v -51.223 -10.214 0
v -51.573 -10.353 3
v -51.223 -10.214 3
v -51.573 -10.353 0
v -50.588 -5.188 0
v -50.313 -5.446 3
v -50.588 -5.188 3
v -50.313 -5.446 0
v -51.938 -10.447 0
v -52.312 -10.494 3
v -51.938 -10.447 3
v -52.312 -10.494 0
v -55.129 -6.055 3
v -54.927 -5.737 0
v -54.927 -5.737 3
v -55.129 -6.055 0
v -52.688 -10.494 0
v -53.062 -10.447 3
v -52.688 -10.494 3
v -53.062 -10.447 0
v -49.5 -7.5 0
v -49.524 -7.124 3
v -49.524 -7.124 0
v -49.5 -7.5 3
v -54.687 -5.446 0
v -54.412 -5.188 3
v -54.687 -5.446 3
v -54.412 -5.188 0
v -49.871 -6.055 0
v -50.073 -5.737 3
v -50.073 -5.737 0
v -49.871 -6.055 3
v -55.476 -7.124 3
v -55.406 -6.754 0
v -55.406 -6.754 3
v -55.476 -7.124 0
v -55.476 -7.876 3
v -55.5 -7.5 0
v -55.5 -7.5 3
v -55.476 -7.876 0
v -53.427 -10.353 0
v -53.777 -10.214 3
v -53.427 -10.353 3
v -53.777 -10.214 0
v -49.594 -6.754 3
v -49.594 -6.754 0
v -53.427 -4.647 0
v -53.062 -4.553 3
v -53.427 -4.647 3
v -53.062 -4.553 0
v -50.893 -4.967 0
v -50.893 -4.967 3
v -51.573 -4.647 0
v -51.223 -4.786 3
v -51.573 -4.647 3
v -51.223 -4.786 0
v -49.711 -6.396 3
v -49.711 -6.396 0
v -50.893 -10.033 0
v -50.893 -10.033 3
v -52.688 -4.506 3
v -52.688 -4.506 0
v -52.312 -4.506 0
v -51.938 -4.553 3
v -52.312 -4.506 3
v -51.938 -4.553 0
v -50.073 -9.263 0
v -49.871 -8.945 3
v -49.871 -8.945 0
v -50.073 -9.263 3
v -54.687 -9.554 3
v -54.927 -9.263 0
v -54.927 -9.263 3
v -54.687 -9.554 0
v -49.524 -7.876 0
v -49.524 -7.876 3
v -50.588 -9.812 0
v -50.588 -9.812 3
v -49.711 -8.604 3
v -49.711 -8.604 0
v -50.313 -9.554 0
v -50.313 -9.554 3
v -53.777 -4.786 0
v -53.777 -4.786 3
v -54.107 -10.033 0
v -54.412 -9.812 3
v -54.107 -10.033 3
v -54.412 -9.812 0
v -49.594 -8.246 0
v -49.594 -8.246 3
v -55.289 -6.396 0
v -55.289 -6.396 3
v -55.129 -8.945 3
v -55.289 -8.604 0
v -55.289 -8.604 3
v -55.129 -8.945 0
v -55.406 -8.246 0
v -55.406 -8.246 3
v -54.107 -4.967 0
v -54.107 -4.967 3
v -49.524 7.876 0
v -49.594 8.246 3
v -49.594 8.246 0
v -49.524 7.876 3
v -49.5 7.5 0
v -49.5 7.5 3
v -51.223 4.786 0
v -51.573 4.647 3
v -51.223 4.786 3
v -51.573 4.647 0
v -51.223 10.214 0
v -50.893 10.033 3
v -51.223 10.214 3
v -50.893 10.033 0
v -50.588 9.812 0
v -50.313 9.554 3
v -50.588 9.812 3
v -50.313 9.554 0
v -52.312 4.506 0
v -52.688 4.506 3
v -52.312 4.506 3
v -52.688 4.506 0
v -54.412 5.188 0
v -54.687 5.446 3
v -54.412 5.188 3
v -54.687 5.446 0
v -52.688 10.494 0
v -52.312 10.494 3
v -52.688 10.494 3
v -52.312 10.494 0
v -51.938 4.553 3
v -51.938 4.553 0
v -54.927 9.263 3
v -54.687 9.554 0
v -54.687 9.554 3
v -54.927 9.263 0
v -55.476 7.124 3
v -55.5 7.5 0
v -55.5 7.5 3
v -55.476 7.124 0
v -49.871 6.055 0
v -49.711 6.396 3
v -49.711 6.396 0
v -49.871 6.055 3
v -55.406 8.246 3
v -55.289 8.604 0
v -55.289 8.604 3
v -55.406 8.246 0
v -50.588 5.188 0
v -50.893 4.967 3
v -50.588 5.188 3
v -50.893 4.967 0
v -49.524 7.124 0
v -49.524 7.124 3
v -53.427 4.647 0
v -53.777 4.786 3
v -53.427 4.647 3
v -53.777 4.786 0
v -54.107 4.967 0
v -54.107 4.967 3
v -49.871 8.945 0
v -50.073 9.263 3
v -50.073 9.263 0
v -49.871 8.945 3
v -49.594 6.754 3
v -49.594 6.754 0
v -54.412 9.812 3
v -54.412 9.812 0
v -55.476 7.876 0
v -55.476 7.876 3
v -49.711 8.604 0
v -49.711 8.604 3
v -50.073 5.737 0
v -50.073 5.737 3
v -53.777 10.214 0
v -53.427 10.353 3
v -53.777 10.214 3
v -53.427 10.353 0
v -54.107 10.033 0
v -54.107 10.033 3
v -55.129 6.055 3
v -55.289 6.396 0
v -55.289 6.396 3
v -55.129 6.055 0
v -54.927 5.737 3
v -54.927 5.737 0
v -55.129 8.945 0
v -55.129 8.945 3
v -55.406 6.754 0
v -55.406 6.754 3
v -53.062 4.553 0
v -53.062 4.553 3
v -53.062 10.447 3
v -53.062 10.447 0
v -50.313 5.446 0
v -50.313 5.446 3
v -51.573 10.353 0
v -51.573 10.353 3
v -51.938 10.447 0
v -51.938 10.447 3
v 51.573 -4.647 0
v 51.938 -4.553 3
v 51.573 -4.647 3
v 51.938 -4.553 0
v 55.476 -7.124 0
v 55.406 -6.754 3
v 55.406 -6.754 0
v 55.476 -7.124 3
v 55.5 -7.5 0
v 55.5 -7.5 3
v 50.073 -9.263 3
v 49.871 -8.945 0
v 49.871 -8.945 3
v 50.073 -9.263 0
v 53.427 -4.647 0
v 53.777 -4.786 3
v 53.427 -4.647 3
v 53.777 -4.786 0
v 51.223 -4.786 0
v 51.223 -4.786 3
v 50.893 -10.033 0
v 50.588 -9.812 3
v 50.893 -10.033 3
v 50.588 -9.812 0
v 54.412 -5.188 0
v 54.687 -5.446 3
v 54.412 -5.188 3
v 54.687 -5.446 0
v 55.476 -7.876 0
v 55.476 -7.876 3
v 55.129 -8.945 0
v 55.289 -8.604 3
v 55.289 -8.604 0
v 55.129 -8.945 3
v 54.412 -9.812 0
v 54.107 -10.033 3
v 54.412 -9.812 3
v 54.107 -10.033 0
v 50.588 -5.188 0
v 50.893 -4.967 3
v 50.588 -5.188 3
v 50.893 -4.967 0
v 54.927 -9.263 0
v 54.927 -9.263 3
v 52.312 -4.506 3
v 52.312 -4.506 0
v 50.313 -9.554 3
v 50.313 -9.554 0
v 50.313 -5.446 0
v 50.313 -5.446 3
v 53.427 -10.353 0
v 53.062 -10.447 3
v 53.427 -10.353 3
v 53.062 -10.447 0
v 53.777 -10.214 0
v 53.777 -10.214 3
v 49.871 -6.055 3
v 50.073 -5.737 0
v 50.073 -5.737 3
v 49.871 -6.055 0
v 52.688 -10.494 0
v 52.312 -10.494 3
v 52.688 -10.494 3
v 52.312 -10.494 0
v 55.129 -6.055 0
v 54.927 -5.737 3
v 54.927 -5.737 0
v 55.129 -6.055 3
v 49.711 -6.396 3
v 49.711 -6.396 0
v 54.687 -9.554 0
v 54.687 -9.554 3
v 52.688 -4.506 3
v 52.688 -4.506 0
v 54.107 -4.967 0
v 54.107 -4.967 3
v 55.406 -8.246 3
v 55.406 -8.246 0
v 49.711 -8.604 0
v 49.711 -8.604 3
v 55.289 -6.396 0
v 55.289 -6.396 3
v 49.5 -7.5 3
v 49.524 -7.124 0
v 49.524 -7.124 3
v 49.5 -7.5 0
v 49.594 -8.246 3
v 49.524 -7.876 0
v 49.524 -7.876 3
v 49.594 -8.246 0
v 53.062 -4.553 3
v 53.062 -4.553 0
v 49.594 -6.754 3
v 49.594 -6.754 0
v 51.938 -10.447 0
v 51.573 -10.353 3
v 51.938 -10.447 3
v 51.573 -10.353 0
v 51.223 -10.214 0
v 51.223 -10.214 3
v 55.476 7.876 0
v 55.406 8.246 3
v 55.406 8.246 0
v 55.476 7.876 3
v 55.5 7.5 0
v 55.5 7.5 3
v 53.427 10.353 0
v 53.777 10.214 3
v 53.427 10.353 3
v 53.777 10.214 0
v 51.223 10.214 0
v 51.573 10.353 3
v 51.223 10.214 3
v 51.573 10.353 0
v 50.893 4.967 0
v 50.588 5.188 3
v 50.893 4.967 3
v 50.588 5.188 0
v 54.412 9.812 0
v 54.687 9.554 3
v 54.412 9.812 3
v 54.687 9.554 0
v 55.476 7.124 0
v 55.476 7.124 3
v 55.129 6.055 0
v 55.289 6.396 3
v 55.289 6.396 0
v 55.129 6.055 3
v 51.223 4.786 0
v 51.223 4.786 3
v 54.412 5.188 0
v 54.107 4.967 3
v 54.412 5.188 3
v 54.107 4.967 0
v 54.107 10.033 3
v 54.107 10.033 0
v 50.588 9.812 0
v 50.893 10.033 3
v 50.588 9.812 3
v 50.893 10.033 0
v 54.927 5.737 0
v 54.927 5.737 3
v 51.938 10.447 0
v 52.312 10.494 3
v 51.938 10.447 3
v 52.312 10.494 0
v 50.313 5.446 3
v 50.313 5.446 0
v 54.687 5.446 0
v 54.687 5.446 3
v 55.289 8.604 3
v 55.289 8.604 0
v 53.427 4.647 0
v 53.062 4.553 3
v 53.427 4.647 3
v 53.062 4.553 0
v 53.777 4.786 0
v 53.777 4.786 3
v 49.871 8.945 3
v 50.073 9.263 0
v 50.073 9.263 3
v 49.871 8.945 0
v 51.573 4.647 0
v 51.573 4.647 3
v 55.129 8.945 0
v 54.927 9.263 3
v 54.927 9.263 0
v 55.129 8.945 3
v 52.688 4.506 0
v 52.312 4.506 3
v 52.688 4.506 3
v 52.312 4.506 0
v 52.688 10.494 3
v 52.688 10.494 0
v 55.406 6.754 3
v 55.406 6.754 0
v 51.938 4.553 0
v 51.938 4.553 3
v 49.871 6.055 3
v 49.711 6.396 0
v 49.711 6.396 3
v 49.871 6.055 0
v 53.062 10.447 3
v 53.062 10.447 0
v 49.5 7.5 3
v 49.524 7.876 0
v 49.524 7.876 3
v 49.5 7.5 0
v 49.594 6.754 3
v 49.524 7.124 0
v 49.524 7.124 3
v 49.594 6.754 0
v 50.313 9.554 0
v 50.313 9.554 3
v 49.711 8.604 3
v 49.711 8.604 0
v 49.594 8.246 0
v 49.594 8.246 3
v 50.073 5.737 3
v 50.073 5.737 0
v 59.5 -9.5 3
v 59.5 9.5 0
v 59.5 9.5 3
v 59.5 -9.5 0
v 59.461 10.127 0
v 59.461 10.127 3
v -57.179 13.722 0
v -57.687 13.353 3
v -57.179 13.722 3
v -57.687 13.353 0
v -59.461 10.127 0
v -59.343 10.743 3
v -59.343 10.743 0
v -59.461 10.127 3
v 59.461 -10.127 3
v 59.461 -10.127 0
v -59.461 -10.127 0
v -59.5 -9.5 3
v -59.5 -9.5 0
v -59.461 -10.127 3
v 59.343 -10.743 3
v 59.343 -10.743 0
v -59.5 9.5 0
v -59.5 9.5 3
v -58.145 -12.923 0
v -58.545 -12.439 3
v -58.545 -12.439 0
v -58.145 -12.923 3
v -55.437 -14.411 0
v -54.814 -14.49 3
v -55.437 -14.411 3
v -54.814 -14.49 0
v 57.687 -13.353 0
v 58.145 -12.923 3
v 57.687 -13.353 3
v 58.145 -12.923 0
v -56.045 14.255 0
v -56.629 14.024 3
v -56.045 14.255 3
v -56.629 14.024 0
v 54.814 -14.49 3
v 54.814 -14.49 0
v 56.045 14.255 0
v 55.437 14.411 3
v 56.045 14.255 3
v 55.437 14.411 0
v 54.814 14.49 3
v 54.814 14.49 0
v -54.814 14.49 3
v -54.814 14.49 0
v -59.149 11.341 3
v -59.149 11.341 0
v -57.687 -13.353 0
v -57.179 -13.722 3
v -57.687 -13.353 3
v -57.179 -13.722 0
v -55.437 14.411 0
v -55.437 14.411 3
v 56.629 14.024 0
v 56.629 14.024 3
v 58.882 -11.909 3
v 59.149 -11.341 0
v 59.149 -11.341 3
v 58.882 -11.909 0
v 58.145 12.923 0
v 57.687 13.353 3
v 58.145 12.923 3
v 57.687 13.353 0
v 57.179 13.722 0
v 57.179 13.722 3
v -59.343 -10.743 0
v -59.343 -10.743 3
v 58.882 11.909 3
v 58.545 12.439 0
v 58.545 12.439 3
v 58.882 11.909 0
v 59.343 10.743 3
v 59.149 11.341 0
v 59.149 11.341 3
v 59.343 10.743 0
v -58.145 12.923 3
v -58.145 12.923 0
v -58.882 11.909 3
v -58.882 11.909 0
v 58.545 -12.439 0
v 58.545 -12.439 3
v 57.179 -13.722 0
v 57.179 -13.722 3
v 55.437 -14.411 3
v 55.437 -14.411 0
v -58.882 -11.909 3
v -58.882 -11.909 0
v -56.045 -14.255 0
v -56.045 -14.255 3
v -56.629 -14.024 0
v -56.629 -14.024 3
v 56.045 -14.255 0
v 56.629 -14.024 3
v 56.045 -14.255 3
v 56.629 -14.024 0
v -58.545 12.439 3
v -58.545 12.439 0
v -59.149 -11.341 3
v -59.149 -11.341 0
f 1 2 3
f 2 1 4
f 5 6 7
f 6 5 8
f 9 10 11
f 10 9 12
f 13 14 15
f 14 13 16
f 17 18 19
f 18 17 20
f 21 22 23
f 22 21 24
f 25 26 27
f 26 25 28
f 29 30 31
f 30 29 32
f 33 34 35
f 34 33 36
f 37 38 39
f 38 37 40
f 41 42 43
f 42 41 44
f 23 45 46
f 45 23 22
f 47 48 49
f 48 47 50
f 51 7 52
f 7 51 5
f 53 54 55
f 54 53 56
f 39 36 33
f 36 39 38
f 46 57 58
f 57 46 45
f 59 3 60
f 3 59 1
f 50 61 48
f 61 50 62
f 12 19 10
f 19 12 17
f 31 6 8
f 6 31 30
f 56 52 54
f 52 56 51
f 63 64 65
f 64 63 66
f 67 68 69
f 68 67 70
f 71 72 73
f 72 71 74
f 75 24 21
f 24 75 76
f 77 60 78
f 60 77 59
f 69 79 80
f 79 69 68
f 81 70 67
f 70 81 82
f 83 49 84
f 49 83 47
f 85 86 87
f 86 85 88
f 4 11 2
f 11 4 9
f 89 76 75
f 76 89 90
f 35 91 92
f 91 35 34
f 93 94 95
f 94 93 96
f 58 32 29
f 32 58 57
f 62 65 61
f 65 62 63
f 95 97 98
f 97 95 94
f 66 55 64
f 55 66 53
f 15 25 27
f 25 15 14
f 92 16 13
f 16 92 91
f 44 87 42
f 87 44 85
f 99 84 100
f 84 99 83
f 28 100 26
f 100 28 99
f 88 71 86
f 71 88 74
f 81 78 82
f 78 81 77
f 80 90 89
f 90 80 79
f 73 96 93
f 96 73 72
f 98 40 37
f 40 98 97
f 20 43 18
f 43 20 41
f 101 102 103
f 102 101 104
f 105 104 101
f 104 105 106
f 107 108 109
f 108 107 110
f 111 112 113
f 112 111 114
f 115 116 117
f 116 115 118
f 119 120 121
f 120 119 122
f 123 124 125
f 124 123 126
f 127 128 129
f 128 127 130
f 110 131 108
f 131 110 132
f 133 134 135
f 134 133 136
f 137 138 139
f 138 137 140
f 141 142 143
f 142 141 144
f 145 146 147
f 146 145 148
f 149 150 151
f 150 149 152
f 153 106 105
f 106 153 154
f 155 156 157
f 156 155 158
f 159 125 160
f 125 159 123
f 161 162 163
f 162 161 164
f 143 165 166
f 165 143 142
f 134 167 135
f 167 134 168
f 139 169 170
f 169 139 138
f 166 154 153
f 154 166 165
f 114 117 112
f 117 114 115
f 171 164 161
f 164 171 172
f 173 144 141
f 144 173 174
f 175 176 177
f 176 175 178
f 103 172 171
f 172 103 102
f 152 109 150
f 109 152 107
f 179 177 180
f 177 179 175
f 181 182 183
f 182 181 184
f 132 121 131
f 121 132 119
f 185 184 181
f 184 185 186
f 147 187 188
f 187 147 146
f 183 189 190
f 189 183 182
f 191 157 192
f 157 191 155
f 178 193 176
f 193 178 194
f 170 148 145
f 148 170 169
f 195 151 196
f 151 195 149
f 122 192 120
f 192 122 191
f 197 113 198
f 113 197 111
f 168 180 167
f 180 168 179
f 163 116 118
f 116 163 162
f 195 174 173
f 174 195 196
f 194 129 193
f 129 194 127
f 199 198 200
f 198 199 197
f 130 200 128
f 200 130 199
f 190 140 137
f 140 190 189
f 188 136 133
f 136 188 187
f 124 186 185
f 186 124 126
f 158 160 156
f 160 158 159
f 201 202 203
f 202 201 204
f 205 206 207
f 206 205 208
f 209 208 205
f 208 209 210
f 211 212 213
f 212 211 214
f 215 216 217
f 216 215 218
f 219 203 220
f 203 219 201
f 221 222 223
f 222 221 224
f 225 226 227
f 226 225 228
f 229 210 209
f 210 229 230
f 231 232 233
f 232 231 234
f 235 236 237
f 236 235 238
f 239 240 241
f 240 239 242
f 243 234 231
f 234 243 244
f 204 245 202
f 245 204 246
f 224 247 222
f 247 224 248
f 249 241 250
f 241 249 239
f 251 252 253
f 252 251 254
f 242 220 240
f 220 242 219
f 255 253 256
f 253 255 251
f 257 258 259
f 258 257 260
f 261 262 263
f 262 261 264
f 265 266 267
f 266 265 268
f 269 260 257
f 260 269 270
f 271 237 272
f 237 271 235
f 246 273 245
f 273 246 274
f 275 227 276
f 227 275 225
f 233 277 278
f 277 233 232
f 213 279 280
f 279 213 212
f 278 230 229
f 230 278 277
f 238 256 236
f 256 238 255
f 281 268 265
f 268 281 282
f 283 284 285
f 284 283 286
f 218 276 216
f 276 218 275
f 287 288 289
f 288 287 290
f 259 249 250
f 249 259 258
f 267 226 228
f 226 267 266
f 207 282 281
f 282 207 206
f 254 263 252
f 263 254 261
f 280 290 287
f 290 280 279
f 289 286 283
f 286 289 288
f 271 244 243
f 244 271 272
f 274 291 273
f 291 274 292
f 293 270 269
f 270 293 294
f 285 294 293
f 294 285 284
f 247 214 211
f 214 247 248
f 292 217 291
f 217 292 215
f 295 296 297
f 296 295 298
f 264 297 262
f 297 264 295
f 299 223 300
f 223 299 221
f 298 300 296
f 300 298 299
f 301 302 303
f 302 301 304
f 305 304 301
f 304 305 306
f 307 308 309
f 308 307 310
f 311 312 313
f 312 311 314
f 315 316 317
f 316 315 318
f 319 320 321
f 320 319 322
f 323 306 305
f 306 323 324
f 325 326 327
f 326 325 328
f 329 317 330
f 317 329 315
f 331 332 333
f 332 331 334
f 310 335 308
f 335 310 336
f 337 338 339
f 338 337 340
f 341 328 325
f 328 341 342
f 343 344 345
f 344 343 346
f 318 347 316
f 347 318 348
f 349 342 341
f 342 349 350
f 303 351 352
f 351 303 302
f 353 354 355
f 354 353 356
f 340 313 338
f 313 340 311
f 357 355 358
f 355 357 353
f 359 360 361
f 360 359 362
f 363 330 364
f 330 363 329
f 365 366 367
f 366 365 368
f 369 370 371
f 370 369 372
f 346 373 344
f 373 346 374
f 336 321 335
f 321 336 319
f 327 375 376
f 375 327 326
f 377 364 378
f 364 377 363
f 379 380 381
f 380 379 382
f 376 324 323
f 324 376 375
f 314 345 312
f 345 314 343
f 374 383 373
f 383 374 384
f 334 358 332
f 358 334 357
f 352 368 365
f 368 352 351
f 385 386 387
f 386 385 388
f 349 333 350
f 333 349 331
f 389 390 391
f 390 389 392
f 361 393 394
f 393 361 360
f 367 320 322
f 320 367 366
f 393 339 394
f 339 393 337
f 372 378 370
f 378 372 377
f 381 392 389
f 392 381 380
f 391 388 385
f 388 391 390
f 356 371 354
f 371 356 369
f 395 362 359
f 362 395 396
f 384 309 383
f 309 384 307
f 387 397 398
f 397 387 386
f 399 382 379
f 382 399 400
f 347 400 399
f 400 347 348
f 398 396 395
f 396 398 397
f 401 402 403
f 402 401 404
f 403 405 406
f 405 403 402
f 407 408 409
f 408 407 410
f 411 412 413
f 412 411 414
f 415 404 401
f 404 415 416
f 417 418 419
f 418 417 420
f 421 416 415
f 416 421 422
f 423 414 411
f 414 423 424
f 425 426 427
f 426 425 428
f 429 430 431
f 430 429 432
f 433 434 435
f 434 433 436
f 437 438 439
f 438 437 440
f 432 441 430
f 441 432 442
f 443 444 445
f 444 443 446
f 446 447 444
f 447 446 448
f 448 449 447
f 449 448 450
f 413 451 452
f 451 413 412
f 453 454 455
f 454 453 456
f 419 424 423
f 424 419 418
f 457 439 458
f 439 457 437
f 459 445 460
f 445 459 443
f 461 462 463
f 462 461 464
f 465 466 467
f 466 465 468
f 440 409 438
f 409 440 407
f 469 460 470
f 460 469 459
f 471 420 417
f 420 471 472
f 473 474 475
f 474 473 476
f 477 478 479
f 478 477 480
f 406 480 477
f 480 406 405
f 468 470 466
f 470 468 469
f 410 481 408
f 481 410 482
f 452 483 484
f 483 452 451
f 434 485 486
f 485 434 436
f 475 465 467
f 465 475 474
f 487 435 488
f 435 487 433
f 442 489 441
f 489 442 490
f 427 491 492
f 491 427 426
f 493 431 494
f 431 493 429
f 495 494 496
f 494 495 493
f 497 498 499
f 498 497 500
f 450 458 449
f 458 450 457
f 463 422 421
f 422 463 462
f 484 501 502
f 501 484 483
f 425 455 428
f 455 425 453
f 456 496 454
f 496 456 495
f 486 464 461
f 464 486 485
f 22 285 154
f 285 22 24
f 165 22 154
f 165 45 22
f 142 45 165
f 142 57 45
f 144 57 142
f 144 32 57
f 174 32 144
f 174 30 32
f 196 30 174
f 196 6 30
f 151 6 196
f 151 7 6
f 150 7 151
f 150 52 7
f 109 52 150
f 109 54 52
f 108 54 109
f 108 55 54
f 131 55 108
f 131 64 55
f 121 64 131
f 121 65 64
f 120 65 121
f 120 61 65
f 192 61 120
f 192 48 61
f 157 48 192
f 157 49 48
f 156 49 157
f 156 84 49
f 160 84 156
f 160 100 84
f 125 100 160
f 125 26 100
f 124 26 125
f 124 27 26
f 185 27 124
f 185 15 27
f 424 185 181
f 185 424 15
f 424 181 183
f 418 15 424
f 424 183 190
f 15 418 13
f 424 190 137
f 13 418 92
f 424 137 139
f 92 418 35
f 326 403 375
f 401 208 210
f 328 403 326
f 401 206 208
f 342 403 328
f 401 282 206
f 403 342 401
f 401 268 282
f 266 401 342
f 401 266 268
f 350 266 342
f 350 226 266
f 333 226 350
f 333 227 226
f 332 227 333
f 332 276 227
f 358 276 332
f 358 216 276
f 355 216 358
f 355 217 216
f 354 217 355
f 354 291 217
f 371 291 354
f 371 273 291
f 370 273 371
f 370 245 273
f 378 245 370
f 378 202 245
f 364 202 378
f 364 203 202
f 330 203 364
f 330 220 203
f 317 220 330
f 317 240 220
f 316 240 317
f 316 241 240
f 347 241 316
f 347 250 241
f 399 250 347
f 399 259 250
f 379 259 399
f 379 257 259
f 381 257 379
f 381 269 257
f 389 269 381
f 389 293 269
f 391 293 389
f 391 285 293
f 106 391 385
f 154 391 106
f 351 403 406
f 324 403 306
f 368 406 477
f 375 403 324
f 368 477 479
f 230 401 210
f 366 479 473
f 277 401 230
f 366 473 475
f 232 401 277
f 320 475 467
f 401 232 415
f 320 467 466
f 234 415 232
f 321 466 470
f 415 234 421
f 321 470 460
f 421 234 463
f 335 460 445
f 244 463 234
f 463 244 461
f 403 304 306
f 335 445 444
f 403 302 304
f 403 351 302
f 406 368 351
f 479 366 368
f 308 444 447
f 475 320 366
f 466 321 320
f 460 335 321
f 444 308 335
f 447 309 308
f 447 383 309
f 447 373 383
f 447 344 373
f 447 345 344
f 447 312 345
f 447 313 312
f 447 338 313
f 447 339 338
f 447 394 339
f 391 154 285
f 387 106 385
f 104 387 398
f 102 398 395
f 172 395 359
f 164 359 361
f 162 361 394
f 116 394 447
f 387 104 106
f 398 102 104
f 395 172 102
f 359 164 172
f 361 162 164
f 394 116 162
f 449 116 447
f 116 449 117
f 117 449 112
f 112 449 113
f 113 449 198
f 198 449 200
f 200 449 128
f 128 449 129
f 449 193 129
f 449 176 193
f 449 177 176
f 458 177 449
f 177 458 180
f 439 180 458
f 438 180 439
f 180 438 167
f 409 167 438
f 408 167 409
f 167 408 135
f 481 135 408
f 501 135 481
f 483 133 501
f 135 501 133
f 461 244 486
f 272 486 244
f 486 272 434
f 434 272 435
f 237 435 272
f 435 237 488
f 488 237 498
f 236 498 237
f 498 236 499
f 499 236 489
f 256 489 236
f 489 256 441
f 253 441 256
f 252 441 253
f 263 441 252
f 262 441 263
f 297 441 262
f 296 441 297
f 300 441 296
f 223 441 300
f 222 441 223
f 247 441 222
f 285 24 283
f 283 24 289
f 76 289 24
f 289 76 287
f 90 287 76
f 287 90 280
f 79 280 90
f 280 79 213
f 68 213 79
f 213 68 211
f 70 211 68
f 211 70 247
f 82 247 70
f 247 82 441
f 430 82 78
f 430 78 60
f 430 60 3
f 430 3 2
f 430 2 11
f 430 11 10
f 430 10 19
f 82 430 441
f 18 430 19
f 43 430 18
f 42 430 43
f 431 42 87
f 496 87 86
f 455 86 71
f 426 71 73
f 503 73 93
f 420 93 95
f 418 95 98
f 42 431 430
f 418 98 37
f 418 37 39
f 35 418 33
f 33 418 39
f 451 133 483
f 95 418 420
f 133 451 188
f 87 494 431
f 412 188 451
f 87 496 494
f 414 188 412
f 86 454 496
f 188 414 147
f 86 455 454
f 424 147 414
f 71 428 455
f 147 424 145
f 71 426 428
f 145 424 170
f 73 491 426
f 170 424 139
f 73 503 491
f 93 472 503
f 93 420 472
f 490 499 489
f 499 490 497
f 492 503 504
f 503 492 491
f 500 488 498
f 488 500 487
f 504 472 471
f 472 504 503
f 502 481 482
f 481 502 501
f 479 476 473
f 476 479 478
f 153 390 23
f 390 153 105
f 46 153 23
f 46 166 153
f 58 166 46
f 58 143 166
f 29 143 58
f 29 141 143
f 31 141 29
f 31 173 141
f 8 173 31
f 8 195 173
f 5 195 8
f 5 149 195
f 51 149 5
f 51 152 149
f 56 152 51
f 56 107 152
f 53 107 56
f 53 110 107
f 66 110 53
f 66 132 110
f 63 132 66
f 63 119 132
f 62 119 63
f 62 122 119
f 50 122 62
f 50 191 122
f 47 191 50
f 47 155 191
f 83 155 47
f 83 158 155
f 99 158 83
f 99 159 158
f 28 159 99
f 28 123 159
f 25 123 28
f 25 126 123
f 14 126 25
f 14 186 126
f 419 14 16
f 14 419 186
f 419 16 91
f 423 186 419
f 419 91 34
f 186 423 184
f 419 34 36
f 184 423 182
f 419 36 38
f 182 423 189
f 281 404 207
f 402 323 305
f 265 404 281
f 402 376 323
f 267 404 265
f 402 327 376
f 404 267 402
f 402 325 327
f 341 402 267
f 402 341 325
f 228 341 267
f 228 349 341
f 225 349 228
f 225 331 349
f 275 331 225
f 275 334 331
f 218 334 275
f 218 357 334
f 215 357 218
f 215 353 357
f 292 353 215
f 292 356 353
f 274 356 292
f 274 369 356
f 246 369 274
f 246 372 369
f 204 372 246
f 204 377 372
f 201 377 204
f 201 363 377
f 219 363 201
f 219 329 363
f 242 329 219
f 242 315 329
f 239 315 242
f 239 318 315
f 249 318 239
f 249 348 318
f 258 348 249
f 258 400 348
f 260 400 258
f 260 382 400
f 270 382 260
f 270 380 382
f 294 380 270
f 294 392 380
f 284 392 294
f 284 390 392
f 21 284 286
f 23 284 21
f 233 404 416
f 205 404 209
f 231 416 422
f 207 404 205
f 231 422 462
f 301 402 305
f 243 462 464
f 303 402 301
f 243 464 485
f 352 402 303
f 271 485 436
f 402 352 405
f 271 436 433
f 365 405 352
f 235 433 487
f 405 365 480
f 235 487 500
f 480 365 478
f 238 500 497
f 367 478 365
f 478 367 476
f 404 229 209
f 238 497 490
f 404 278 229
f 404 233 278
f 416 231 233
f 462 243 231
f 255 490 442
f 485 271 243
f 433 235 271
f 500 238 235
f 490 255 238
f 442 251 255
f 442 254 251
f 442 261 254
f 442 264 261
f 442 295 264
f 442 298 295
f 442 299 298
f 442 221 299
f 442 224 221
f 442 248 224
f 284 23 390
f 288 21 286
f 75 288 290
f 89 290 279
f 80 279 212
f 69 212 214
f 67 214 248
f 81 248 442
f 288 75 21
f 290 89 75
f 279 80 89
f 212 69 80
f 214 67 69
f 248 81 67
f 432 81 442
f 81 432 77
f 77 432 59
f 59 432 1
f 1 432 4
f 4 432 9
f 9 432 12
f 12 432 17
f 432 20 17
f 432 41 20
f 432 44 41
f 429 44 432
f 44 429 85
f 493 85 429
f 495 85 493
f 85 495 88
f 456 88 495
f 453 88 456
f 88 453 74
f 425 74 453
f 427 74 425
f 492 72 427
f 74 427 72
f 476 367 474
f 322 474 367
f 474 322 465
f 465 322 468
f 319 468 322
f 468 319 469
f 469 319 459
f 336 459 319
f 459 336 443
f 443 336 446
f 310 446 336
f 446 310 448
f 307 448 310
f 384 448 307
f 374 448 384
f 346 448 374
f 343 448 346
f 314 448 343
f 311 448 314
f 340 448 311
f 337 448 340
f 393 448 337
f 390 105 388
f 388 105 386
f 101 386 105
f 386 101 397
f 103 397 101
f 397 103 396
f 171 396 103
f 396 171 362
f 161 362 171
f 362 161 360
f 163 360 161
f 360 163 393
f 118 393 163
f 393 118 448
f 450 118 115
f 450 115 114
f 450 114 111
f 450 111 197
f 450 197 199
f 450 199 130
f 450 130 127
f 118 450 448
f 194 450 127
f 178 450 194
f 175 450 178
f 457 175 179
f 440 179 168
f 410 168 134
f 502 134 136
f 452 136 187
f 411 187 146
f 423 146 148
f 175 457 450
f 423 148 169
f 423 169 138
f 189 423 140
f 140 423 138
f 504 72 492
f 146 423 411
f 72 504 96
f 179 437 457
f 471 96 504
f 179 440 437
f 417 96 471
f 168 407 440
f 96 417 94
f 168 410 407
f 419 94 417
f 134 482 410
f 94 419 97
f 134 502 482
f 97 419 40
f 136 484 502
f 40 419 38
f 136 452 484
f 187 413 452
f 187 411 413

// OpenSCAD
$fn = 50;


difference() {
	union() {
		hull() {
			translate(v = [-54.5000000000, 9.5000000000, 0]) {
				cylinder(h = 3, r = 5);
			}
			translate(v = [54.5000000000, 9.5000000000, 0]) {
				cylinder(h = 3, r = 5);
			}
			translate(v = [-54.5000000000, -9.5000000000, 0]) {
				cylinder(h = 3, r = 5);
			}
			translate(v = [54.5000000000, -9.5000000000, 0]) {
				cylinder(h = 3, r = 5);
			}
		}
	}
	union() {
		translate(v = [-52.5000000000, -7.5000000000, -100.0000000000]) {
			cylinder(h = 200, r = 3.0000000000);
		}
		translate(v = [-52.5000000000, 7.5000000000, -100.0000000000]) {
			cylinder(h = 200, r = 3.0000000000);
		}
		translate(v = [52.5000000000, -7.5000000000, -100.0000000000]) {
			cylinder(h = 200, r = 3.0000000000);
		}
		translate(v = [52.5000000000, 7.5000000000, -100.0000000000]) {
			cylinder(h = 200, r = 3.0000000000);
		}
	}
}
